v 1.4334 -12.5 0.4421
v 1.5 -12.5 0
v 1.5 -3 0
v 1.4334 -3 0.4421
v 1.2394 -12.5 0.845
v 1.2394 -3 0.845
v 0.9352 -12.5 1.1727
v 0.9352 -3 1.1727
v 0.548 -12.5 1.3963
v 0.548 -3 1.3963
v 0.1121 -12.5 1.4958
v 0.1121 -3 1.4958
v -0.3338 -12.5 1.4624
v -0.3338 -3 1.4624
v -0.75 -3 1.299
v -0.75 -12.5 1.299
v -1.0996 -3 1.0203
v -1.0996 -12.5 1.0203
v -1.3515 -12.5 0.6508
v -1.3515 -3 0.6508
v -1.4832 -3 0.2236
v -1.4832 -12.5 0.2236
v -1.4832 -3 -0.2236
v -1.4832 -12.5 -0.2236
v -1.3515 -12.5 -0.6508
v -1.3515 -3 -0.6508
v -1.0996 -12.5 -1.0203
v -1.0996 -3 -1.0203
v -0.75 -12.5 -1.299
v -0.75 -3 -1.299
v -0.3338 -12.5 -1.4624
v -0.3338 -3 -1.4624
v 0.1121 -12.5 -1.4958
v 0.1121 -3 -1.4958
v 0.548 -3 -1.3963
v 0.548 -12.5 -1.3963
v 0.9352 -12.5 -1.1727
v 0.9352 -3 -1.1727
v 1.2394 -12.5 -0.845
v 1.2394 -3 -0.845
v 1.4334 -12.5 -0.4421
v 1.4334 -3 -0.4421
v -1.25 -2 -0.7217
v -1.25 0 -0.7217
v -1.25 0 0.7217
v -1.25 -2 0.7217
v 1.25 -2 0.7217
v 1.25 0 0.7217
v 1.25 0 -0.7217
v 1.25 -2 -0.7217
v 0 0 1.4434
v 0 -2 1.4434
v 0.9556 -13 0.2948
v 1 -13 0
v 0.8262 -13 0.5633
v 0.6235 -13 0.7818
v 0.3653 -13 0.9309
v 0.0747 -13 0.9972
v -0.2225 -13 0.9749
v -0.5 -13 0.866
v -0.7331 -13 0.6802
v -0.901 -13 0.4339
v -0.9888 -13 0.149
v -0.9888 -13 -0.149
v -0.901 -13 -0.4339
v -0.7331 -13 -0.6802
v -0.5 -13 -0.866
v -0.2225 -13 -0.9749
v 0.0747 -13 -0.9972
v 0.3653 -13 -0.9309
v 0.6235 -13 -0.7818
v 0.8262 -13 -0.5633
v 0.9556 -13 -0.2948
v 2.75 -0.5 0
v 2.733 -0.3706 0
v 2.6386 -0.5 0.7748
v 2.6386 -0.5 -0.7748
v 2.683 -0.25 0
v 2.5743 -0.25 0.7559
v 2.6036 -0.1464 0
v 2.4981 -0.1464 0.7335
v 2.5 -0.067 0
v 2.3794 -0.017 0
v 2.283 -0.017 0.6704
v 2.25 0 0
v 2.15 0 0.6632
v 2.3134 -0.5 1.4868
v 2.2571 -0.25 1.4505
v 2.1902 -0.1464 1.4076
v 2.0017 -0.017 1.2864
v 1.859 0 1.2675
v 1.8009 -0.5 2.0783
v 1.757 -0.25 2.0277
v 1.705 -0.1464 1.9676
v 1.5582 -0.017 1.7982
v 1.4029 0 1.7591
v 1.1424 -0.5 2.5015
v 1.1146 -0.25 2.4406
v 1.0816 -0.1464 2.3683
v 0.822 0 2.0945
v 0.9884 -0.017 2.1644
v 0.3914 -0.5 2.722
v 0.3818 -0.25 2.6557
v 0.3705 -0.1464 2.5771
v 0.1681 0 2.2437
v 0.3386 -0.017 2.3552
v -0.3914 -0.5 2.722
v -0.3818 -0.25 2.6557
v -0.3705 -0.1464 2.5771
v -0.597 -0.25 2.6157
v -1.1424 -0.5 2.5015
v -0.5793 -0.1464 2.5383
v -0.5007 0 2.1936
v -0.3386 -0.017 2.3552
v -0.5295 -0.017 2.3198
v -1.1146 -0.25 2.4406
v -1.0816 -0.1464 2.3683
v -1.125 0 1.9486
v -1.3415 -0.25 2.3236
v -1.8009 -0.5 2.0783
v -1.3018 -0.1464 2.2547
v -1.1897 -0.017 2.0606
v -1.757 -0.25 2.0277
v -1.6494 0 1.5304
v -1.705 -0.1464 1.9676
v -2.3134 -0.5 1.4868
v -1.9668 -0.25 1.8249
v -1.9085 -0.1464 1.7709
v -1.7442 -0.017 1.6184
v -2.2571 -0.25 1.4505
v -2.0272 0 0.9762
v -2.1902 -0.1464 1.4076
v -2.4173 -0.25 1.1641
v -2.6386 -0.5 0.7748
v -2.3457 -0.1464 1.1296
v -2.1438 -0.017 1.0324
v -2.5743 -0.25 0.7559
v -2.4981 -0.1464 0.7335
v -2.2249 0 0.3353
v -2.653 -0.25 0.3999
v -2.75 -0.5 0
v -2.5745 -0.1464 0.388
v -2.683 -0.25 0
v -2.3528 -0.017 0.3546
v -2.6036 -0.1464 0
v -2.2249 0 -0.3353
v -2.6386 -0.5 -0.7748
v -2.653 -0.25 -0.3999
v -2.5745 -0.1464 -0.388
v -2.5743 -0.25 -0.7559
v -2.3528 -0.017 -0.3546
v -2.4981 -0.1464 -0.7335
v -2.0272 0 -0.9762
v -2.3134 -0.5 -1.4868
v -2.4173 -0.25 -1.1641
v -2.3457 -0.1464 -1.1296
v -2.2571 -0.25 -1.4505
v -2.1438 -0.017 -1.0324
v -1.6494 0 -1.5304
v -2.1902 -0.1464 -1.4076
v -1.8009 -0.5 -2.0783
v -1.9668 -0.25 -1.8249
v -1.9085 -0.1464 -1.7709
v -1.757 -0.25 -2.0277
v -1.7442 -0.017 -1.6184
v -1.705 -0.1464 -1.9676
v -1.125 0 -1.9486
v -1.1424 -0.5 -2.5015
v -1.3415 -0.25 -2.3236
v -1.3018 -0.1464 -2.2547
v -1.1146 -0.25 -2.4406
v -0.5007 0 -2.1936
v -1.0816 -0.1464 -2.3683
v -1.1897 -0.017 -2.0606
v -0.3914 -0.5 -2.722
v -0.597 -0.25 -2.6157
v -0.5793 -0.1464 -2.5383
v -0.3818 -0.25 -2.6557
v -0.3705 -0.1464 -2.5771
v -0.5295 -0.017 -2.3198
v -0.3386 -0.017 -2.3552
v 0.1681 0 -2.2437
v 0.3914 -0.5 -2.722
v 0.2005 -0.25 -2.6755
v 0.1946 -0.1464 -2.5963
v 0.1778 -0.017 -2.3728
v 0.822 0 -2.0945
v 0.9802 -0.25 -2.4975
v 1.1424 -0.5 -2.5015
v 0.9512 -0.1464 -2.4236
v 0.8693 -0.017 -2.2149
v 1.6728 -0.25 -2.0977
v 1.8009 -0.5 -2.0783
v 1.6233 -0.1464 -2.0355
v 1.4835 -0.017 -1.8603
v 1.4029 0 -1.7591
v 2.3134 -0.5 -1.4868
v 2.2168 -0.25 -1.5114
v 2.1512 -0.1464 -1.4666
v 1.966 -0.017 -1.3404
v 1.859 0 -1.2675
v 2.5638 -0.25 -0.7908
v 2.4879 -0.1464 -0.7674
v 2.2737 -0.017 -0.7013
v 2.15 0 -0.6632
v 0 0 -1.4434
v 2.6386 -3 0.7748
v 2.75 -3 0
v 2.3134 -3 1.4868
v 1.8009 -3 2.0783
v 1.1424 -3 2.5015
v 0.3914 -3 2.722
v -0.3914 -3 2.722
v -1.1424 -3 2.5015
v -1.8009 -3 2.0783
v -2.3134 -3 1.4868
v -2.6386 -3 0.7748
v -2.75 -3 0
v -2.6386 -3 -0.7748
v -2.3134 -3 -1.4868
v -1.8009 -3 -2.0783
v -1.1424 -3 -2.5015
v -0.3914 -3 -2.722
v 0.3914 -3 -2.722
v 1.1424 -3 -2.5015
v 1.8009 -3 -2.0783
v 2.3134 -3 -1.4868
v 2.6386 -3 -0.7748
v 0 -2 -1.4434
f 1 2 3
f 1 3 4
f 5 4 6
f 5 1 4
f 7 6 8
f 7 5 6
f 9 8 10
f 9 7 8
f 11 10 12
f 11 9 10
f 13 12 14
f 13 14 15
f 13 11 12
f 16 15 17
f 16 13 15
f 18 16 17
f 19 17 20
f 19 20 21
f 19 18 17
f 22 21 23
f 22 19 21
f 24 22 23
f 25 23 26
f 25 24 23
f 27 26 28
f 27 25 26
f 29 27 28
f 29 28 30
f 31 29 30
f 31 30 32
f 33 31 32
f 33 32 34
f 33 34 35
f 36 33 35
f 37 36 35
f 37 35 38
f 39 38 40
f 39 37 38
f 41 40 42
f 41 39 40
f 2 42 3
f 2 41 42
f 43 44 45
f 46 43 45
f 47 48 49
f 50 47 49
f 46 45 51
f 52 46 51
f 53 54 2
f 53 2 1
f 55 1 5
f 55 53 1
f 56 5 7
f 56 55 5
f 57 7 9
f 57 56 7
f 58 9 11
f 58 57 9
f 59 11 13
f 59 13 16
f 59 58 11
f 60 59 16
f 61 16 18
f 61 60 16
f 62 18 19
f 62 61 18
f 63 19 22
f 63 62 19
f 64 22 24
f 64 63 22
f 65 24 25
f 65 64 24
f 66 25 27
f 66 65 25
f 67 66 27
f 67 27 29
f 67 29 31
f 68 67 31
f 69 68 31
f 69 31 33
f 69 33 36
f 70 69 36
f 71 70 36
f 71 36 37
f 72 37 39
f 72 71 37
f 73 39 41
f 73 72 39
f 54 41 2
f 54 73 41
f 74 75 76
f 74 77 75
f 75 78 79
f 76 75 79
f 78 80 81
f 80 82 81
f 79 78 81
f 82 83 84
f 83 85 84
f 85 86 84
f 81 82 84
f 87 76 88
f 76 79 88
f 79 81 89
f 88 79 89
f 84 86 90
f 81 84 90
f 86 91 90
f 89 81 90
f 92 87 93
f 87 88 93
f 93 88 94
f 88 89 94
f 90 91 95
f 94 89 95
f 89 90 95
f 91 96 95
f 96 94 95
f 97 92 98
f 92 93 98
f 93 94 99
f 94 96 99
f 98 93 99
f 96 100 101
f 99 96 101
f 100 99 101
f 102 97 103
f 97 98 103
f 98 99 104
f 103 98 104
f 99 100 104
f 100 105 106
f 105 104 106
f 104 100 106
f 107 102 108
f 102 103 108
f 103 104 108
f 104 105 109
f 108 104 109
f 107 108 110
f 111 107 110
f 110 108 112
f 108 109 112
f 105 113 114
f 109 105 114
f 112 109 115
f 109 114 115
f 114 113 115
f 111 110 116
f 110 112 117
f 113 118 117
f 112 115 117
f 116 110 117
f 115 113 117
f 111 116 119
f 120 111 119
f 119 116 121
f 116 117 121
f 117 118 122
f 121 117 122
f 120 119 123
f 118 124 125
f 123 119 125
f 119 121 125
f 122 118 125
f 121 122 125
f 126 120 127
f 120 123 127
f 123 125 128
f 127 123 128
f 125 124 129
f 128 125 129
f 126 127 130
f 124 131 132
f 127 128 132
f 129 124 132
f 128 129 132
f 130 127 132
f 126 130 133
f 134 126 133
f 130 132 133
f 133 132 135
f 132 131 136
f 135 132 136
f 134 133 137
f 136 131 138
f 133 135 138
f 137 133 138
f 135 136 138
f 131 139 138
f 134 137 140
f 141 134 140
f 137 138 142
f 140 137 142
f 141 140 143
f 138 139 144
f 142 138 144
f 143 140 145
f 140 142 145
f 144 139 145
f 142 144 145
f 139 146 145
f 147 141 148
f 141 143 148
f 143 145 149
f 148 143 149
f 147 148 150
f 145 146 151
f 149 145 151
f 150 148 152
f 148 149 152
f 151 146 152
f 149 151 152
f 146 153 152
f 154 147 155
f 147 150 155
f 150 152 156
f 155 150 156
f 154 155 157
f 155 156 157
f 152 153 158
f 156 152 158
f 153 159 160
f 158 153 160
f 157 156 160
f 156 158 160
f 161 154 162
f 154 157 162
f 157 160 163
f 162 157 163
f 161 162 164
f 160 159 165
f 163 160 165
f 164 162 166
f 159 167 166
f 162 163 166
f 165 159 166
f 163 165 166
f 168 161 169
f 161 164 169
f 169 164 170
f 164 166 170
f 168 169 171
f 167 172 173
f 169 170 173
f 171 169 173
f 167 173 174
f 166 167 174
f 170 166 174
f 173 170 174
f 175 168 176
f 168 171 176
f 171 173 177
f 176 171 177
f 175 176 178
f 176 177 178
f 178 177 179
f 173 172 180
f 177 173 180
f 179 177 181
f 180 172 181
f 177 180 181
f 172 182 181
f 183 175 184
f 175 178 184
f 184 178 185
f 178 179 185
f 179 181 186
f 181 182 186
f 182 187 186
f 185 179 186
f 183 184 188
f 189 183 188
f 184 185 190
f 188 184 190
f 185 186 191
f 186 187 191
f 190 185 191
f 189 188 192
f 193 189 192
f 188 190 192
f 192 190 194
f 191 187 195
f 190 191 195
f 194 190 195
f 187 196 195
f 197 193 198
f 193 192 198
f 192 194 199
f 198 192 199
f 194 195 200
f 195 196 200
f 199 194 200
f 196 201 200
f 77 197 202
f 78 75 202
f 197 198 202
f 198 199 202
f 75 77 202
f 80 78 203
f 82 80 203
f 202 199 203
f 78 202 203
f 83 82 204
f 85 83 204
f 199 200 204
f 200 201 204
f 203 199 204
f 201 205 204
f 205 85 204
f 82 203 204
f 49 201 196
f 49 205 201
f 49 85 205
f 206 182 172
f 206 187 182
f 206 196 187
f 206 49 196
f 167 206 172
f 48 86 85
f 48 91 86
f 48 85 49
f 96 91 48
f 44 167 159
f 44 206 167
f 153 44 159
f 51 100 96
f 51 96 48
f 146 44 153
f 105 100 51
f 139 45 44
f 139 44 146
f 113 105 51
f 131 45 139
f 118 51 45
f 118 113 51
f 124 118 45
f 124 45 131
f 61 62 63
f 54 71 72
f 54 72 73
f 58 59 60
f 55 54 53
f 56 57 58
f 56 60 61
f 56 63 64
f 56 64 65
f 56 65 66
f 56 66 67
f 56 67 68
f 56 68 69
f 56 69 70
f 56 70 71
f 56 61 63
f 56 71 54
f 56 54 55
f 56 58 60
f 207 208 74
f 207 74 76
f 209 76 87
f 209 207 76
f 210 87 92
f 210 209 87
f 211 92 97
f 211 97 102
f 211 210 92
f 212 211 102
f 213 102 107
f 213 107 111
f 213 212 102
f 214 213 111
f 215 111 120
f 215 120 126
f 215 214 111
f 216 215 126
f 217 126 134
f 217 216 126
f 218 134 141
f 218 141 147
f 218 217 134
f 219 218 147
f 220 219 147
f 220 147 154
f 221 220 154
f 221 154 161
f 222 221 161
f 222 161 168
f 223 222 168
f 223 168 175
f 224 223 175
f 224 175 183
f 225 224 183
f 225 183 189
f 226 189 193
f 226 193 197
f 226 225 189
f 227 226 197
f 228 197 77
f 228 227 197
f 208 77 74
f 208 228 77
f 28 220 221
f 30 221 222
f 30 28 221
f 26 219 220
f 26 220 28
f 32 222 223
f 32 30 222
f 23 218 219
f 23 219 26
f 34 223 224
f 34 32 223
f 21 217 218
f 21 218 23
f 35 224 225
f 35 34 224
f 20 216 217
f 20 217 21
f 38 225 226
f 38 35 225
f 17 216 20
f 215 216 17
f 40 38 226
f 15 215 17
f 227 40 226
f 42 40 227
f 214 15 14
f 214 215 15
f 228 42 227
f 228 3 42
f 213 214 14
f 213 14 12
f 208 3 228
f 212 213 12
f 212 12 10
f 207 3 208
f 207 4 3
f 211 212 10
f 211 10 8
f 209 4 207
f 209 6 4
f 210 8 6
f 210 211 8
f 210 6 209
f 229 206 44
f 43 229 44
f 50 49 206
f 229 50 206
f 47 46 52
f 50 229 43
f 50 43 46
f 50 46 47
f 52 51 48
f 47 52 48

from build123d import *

# Parameters (mm, degrees)
CORTAR_EXTRUIR1_DEPTH = 2
CHAFL_N1_SIZE         = 0.5
REDONDEO1_R           = 0.5


with BuildPart() as part:
    # Croquis1 → Revolución1 (revolve)
    with BuildSketch(Plane.XY):
        Polygon((0, 0), (2.75, 0), (2.75, -3), (1.5, -3), (1.5, -13), (0, -13), align=None)
    revolve(axis=Axis((0, 0, 0), (0, -1, 0)))

    # Croquis2 → Cortar-Extruir1 (cut)
    with BuildSketch(Plane(origin=(0, 0, 0), x_dir=(1, 0, 0), z_dir=(0, 1, 0))):
        Polygon((1.25, 0.721687836), (0, 1.443375673), (-1.25, 0.721687836), (-1.25, -0.721687836), (0, -1.443375673), (1.25, -0.721687836), align=None)
    extrude(amount=-CORTAR_EXTRUIR1_DEPTH, mode=Mode.SUBTRACT)

    # Chaflán1
    chafl_n1_edges = [part.edges().sort_by_distance(p)[0] for p in [
        (-1.5, -13, 0),
    ]]
    chamfer(chafl_n1_edges, length=CHAFL_N1_SIZE)

    # Redondeo1
    redondeo1_edges = [part.edges().sort_by_distance(p)[0] for p in [
        (-2.75, 0, 0),
    ]]
    fillet(redondeo1_edges, radius=REDONDEO1_R)


solid = part.part
